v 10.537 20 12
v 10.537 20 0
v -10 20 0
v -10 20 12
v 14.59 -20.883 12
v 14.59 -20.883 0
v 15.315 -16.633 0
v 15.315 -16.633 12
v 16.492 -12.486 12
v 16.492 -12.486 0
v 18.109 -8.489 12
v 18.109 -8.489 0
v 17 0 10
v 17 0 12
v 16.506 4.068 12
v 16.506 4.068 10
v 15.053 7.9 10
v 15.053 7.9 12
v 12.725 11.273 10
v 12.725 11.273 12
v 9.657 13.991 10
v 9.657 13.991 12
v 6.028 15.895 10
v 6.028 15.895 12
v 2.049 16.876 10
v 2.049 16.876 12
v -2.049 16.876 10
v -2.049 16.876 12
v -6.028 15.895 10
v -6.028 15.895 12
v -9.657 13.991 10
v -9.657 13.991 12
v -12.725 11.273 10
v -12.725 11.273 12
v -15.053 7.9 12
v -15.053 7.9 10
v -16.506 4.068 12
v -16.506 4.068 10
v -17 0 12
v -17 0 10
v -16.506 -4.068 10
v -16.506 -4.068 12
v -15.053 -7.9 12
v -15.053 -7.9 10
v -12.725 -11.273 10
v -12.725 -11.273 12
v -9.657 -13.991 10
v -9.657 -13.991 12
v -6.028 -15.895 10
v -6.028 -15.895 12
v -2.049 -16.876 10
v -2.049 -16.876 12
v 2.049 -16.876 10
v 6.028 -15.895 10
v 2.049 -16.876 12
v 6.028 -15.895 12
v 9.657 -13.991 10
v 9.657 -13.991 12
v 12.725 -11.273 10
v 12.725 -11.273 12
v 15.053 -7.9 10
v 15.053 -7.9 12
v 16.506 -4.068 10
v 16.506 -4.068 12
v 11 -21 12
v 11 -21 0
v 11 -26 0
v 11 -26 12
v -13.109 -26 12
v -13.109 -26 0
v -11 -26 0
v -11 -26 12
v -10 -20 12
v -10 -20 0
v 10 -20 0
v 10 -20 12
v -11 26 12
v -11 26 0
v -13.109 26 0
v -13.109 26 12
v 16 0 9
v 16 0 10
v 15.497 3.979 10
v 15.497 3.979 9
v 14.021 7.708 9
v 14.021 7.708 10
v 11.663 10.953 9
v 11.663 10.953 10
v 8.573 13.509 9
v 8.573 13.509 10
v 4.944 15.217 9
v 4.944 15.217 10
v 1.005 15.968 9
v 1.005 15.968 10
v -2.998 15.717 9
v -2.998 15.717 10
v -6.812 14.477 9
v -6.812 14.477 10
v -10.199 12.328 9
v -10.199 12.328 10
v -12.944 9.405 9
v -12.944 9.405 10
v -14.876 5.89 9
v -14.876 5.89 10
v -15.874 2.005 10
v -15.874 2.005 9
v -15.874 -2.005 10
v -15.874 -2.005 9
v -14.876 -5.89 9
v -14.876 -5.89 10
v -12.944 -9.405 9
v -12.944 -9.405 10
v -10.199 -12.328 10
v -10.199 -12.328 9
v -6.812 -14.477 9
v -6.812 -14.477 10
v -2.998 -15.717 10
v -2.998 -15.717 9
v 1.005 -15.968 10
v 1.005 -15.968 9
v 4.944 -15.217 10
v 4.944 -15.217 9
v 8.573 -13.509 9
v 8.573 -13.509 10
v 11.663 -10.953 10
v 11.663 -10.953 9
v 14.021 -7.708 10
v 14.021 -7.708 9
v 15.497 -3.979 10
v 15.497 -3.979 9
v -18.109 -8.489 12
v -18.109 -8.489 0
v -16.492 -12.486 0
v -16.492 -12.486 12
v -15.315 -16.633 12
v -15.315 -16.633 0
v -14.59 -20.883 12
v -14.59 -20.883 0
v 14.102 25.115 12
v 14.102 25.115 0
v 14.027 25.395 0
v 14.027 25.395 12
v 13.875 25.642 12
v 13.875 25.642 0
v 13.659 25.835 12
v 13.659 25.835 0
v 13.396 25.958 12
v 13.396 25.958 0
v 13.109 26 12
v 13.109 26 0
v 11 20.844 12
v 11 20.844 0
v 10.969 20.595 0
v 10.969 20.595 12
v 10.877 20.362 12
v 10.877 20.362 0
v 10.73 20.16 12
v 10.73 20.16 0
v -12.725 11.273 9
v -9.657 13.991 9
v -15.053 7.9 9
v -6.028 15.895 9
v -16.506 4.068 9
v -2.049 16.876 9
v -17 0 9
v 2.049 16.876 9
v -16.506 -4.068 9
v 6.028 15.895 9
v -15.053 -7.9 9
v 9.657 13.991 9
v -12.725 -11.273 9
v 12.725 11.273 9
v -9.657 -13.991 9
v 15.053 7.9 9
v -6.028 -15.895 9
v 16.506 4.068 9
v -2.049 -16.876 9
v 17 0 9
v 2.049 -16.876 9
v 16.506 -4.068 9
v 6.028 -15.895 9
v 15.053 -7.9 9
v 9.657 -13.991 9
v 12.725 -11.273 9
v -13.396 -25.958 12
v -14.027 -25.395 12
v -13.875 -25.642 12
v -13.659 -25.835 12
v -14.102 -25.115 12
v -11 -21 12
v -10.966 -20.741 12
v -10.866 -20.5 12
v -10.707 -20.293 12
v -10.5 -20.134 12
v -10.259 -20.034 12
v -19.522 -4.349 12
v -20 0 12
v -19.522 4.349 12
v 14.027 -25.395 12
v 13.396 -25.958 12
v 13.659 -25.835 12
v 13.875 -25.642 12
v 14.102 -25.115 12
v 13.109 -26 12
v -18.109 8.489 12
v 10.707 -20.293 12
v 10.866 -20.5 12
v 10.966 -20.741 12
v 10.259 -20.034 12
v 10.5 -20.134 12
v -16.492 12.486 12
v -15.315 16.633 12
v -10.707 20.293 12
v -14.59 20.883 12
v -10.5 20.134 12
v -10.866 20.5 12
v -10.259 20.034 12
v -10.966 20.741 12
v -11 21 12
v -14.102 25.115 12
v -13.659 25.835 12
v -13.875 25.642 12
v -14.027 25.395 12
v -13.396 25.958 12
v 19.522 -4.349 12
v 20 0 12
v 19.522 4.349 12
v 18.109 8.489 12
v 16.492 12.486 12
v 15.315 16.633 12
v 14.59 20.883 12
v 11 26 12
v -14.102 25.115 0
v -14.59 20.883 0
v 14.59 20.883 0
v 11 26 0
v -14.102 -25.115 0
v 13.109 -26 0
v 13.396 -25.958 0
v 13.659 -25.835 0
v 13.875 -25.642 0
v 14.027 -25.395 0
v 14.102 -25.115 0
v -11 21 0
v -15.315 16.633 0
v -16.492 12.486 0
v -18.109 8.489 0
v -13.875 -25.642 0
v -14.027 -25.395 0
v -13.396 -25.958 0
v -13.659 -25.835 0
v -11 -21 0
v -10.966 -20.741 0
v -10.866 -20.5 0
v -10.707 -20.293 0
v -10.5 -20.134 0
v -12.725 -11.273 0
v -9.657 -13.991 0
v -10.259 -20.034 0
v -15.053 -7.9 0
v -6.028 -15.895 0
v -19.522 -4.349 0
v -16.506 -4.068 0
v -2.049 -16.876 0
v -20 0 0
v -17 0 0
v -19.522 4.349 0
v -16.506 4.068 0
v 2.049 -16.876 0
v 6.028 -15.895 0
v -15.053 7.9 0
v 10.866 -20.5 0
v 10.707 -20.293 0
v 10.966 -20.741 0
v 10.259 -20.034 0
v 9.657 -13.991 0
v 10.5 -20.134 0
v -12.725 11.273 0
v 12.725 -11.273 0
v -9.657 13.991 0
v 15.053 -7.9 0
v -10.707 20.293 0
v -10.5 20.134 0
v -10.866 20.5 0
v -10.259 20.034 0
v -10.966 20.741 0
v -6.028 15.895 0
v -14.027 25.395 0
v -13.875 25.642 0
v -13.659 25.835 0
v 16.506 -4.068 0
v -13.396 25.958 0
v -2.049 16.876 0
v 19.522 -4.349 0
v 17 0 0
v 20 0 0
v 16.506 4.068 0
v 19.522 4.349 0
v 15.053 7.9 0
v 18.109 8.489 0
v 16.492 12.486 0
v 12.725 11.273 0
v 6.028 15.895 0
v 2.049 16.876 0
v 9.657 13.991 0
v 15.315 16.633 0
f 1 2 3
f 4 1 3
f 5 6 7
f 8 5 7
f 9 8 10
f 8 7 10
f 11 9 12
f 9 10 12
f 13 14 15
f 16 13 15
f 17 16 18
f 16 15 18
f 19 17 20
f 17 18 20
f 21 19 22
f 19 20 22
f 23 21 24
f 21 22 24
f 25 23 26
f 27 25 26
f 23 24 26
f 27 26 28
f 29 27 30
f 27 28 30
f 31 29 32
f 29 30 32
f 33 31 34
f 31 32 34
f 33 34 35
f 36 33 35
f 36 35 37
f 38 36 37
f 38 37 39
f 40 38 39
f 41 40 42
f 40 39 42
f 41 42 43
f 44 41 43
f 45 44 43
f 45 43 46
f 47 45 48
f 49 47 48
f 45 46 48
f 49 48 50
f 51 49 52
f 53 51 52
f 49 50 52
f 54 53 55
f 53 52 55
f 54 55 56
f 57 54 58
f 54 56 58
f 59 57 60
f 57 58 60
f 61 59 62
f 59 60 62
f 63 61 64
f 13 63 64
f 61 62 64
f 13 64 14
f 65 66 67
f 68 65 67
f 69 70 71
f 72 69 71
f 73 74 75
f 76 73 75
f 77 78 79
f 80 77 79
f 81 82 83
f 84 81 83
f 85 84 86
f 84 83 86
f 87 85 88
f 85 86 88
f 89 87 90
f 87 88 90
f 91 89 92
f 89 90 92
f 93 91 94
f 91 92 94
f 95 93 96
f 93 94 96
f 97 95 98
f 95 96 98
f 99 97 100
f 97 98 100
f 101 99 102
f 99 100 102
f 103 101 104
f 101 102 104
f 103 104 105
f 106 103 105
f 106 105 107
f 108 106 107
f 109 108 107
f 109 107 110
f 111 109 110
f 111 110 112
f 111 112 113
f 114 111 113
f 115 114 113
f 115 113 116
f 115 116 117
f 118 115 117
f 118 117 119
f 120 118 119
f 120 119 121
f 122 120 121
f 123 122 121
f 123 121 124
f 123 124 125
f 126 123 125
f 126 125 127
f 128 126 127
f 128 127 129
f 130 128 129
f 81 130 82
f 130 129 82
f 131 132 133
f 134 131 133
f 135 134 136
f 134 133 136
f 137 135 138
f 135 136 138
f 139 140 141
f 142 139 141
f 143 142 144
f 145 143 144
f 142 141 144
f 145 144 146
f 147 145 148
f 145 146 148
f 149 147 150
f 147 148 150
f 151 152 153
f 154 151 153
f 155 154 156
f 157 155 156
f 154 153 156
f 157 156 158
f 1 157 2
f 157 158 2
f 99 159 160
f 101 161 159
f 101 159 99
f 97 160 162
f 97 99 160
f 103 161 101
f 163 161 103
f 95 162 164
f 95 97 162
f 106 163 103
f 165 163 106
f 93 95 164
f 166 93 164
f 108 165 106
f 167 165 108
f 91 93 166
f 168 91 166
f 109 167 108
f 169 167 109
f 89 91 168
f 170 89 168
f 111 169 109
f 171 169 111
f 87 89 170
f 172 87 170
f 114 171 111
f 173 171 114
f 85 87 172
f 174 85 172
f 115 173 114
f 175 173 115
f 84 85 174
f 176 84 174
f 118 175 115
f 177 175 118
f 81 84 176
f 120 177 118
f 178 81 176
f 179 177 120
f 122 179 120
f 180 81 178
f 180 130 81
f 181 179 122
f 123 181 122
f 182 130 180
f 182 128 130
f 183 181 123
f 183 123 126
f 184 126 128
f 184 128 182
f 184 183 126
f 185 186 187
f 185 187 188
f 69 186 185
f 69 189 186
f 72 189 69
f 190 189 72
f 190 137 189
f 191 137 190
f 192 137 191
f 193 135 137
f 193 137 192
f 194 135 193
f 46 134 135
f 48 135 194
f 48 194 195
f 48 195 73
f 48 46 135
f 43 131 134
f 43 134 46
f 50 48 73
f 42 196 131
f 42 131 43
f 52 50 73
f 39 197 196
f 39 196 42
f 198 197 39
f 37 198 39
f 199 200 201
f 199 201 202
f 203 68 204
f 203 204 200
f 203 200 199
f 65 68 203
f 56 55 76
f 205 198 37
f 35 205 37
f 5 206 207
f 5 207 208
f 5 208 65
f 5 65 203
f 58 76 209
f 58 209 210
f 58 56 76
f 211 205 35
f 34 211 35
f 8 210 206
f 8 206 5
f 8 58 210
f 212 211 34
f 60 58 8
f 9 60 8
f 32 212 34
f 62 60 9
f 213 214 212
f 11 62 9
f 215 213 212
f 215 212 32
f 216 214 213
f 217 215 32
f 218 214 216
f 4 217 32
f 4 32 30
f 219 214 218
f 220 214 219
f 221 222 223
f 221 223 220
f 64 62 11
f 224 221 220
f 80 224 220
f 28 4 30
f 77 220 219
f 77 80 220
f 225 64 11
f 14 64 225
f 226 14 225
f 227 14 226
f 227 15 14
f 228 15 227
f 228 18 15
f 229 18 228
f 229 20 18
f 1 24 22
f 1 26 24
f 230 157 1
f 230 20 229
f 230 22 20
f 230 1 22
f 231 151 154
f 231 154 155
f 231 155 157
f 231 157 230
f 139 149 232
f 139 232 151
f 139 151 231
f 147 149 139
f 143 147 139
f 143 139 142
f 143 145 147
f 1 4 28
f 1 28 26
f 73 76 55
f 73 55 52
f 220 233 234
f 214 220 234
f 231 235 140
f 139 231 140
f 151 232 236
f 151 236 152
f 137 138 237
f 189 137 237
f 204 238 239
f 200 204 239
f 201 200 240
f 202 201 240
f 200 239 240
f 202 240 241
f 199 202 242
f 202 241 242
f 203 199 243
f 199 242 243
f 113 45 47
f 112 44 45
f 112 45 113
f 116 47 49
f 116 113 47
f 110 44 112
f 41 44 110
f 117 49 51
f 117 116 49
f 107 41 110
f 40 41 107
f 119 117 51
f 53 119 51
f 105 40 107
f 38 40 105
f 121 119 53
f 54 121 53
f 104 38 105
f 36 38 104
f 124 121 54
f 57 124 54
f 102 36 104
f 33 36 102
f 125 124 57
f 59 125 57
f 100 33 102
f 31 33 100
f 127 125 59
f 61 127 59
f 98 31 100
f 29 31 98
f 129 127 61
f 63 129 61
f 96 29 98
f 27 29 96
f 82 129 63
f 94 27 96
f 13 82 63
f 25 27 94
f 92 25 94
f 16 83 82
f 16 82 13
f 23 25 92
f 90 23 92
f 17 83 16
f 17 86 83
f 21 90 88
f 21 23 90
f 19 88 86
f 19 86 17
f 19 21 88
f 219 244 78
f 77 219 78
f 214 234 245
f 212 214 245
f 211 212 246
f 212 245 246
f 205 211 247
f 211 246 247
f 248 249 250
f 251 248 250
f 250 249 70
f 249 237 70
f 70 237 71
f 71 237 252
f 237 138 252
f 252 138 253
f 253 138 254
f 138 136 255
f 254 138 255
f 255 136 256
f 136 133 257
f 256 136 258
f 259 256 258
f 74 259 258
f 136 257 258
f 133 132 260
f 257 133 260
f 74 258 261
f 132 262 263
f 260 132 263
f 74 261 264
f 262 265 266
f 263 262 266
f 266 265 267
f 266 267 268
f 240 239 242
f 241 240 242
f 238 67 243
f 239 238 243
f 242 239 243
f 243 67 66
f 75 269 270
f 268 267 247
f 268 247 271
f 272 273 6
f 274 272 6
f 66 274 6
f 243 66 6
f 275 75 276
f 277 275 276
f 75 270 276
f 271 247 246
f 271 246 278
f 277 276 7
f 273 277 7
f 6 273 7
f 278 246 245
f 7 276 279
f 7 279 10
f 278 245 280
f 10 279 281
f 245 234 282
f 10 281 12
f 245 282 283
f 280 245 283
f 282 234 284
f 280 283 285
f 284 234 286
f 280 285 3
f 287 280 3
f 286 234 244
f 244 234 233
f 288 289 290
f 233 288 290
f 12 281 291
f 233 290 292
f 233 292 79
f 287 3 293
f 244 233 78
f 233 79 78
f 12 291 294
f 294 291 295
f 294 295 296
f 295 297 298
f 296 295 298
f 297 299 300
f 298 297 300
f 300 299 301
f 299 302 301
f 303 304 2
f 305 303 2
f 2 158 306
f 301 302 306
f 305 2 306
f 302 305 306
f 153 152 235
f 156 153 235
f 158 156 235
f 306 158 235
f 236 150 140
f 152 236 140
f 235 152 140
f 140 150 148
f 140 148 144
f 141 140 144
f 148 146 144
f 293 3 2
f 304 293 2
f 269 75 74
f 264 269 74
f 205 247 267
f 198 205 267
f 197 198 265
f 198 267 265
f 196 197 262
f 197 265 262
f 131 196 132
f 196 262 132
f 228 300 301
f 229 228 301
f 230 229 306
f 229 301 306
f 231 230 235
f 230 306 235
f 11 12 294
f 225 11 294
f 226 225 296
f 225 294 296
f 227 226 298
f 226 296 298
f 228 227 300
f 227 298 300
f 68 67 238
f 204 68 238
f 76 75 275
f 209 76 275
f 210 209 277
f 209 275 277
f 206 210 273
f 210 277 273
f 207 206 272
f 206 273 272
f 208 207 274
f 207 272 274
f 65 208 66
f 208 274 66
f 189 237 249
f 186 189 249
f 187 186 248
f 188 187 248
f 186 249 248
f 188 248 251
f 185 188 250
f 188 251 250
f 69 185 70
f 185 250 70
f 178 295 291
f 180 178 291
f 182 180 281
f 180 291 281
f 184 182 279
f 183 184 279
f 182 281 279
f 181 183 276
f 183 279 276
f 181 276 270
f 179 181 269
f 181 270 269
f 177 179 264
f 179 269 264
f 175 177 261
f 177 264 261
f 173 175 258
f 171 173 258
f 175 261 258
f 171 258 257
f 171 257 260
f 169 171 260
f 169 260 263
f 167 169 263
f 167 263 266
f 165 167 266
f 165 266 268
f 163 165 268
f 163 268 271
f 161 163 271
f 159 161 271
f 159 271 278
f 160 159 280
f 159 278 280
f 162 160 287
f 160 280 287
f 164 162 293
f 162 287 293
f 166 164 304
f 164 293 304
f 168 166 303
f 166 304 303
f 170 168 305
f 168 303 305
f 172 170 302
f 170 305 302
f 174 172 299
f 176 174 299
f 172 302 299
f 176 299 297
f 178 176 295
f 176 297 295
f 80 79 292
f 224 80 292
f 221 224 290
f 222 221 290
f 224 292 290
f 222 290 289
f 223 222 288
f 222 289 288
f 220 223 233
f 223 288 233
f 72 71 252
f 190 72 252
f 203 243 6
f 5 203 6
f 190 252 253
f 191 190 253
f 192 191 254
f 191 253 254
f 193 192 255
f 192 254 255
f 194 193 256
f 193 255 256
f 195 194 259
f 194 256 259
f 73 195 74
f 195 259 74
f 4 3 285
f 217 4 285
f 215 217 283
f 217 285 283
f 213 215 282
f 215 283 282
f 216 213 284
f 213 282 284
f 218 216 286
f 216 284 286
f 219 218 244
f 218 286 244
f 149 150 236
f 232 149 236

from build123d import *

# Parameters (mm, degrees)
F1_DEPTH = 12
F3_R     = 16
F4_DEPTH = 12.001
F5_R     = 17
F5_R_2   = 16
F6_DEPTH = 2
F2_R     = 17
F7_DEPTH = 9


# Not quite as in the source:
# - the program builds the solid bodies; features that only make, move or delete a surface that nothing else refers to are left out


with BuildPart() as f1:
    # F0 (on Top) → F1 (new body)
    with BuildSketch(Plane.XY):
        with BuildLine():
            Line((10.5367190596, 20), (0, 20))
            Line((0, 20), (-10, 20))
            ThreePointArc((-10, 20), (-10.7071067812, 20.2928932188), (-11, 21))
            Line((-11, 21), (-11, 26))
            Line((-11, 26), (-13.1087498209, 26))
            ThreePointArc((-13.1087498209, 26), (-13.7740978096, 25.7465333576), (-14.1021587568, 25.114624108))
            Line((-14.1021587568, 25.114624108), (-14.5904720191, 20.8825758343))
            ThreePointArc((-14.5904720191, 20.8825758343), (-15.8474732978, 14.5432941931), (-18.1089431513, 8.4891800512))
            ThreePointArc((-18.1089431513, 8.4891800512), (-20, 0), (-18.1089431513, -8.4891800512))
            ThreePointArc((-18.1089431513, -8.4891800512), (-15.8474732978, -14.5432941931), (-14.5904720191, -20.8825758343))
            Line((-14.5904720191, -20.8825758343), (-14.1021587568, -25.114624108))
            ThreePointArc((-14.1021587568, -25.114624108), (-13.7740978096, -25.7465333576), (-13.1087498209, -26))
            Line((-13.1087498209, -26), (-11, -26))
            Line((-11, -26), (-11, -21))
            ThreePointArc((-11, -21), (-10.7071067812, -20.2928932188), (-10, -20))
            Line((-10, -20), (0, -20))
            Line((0, -20), (10, -20))
            ThreePointArc((10, -20), (10.7071067812, -20.2928932188), (11, -21))
            Line((11, -21), (11, -26))
            Line((11, -26), (13.1087498209, -26))
            ThreePointArc((13.1087498209, -26), (13.7740978096, -25.7465333576), (14.1021587568, -25.114624108))
            Line((14.1021587568, -25.114624108), (14.5904720191, -20.8825758343))
            ThreePointArc((14.5904720191, -20.8825758343), (15.8474732978, -14.5432941931), (18.1089431513, -8.4891800512))
            ThreePointArc((18.1089431513, -8.4891800512), (20, 0), (18.1089431513, 8.4891800512))
            ThreePointArc((18.1089431513, 8.4891800512), (15.8474732978, 14.5432941931), (14.5904720191, 20.8825758343))
            Line((14.5904720191, 20.8825758343), (14.1021587568, 25.114624108))
            ThreePointArc((14.1021587568, 25.114624108), (13.7740978096, 25.7465333576), (13.1087498209, 26))
            Line((13.1087498209, 26), (11, 26))
            Line((11, 26), (11, 20.8437610154))
            ThreePointArc((11, 20.8437610154), (10.8765611957, 20.3624705935), (10.5367190596, 20))
        make_face()
    extrude(amount=F1_DEPTH)

    # F3 (on face) → F4 (cut, through all)
    with BuildSketch(Plane.XY.offset(12)):
        Circle(F3_R)
    extrude(amount=-F4_DEPTH, mode=Mode.SUBTRACT)

    # F5 (on face) → F6 (cut)
    with BuildSketch(Plane.XY.offset(12)):
        Circle(F5_R)
        Circle(F5_R_2, mode=Mode.SUBTRACT)
    extrude(amount=-F6_DEPTH, mode=Mode.SUBTRACT)

    # F2 (on face) → F7 (cut)
    with BuildSketch(Plane(origin=(0, 0, 0), x_dir=(1, 0, 0), z_dir=(0, 0, -1))):
        Circle(F2_R)
    extrude(amount=-F7_DEPTH, mode=Mode.SUBTRACT)


solid = f1.part
